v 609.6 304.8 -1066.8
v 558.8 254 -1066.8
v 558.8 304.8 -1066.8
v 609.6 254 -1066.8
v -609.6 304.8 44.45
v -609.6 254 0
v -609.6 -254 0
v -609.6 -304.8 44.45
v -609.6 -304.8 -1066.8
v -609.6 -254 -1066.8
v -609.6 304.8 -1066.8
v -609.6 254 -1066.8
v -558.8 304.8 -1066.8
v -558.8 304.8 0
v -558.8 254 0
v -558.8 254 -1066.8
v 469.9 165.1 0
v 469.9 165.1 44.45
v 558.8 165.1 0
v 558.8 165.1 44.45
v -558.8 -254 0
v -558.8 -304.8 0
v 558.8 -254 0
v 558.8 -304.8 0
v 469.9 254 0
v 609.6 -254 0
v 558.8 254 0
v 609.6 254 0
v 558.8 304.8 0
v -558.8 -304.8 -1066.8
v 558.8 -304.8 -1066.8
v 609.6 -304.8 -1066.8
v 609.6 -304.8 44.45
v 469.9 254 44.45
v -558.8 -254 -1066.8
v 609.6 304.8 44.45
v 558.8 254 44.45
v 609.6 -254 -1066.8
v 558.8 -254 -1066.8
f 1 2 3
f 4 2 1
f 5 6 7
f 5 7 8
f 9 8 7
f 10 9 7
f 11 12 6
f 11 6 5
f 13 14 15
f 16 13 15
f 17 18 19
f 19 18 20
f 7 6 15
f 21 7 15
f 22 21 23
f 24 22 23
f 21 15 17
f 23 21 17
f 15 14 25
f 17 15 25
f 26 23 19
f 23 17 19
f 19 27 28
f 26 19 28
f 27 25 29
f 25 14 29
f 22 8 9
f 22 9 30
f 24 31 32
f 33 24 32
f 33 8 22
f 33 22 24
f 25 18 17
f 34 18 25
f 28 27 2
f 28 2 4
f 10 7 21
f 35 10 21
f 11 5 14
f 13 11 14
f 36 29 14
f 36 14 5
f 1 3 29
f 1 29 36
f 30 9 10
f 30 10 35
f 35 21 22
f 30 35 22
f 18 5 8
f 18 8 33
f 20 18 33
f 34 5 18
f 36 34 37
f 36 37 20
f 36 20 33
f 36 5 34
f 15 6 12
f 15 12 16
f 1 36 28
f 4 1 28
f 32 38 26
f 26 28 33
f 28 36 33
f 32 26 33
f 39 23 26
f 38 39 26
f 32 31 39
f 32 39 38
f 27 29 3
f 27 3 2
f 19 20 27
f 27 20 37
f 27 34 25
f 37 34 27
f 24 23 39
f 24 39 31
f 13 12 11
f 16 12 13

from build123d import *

# Parameters (mm, degrees)
F0_W     = 1219.2
F0_H     = 609.6
F1_DEPTH = 44.45
F2_W     = 88.9
F2_H     = 88.9
F3_DEPTH = 44.451
F4_W     = 50.8
F4_H     = 50.8
F5_DEPTH = 1066.8


with BuildPart() as f1:
    # F0 (on Top) → F1 (new body)
    with BuildSketch(Plane.XY):
        Rectangle(F0_W, F0_H)
    extrude(amount=F1_DEPTH)

    # F2 (on face) → F3 (cut, through all)
    with BuildSketch(Plane.XY.offset(44.45)):
        with Locations((514.35, 209.55)):
            Rectangle(F2_W, F2_H)
    extrude(amount=-F3_DEPTH, mode=Mode.SUBTRACT)

    # F4 (on face) → F5 (join)
    with BuildSketch(Plane(origin=(0, 0, 0), x_dir=(1, 0, 0), z_dir=(0, 0, -1))):
        with Locations((584.2, 279.4)):
            Rectangle(F4_W, F4_H)
        with Locations((-584.2, 279.4)):
            Rectangle(F4_W, F4_H)
        with Locations((-584.2, -279.4)):
            Rectangle(F4_W, F4_H)
        with Locations((584.2, -279.4)):
            Rectangle(F4_W, F4_H)
    extrude(amount=F5_DEPTH)


solid = f1.part
